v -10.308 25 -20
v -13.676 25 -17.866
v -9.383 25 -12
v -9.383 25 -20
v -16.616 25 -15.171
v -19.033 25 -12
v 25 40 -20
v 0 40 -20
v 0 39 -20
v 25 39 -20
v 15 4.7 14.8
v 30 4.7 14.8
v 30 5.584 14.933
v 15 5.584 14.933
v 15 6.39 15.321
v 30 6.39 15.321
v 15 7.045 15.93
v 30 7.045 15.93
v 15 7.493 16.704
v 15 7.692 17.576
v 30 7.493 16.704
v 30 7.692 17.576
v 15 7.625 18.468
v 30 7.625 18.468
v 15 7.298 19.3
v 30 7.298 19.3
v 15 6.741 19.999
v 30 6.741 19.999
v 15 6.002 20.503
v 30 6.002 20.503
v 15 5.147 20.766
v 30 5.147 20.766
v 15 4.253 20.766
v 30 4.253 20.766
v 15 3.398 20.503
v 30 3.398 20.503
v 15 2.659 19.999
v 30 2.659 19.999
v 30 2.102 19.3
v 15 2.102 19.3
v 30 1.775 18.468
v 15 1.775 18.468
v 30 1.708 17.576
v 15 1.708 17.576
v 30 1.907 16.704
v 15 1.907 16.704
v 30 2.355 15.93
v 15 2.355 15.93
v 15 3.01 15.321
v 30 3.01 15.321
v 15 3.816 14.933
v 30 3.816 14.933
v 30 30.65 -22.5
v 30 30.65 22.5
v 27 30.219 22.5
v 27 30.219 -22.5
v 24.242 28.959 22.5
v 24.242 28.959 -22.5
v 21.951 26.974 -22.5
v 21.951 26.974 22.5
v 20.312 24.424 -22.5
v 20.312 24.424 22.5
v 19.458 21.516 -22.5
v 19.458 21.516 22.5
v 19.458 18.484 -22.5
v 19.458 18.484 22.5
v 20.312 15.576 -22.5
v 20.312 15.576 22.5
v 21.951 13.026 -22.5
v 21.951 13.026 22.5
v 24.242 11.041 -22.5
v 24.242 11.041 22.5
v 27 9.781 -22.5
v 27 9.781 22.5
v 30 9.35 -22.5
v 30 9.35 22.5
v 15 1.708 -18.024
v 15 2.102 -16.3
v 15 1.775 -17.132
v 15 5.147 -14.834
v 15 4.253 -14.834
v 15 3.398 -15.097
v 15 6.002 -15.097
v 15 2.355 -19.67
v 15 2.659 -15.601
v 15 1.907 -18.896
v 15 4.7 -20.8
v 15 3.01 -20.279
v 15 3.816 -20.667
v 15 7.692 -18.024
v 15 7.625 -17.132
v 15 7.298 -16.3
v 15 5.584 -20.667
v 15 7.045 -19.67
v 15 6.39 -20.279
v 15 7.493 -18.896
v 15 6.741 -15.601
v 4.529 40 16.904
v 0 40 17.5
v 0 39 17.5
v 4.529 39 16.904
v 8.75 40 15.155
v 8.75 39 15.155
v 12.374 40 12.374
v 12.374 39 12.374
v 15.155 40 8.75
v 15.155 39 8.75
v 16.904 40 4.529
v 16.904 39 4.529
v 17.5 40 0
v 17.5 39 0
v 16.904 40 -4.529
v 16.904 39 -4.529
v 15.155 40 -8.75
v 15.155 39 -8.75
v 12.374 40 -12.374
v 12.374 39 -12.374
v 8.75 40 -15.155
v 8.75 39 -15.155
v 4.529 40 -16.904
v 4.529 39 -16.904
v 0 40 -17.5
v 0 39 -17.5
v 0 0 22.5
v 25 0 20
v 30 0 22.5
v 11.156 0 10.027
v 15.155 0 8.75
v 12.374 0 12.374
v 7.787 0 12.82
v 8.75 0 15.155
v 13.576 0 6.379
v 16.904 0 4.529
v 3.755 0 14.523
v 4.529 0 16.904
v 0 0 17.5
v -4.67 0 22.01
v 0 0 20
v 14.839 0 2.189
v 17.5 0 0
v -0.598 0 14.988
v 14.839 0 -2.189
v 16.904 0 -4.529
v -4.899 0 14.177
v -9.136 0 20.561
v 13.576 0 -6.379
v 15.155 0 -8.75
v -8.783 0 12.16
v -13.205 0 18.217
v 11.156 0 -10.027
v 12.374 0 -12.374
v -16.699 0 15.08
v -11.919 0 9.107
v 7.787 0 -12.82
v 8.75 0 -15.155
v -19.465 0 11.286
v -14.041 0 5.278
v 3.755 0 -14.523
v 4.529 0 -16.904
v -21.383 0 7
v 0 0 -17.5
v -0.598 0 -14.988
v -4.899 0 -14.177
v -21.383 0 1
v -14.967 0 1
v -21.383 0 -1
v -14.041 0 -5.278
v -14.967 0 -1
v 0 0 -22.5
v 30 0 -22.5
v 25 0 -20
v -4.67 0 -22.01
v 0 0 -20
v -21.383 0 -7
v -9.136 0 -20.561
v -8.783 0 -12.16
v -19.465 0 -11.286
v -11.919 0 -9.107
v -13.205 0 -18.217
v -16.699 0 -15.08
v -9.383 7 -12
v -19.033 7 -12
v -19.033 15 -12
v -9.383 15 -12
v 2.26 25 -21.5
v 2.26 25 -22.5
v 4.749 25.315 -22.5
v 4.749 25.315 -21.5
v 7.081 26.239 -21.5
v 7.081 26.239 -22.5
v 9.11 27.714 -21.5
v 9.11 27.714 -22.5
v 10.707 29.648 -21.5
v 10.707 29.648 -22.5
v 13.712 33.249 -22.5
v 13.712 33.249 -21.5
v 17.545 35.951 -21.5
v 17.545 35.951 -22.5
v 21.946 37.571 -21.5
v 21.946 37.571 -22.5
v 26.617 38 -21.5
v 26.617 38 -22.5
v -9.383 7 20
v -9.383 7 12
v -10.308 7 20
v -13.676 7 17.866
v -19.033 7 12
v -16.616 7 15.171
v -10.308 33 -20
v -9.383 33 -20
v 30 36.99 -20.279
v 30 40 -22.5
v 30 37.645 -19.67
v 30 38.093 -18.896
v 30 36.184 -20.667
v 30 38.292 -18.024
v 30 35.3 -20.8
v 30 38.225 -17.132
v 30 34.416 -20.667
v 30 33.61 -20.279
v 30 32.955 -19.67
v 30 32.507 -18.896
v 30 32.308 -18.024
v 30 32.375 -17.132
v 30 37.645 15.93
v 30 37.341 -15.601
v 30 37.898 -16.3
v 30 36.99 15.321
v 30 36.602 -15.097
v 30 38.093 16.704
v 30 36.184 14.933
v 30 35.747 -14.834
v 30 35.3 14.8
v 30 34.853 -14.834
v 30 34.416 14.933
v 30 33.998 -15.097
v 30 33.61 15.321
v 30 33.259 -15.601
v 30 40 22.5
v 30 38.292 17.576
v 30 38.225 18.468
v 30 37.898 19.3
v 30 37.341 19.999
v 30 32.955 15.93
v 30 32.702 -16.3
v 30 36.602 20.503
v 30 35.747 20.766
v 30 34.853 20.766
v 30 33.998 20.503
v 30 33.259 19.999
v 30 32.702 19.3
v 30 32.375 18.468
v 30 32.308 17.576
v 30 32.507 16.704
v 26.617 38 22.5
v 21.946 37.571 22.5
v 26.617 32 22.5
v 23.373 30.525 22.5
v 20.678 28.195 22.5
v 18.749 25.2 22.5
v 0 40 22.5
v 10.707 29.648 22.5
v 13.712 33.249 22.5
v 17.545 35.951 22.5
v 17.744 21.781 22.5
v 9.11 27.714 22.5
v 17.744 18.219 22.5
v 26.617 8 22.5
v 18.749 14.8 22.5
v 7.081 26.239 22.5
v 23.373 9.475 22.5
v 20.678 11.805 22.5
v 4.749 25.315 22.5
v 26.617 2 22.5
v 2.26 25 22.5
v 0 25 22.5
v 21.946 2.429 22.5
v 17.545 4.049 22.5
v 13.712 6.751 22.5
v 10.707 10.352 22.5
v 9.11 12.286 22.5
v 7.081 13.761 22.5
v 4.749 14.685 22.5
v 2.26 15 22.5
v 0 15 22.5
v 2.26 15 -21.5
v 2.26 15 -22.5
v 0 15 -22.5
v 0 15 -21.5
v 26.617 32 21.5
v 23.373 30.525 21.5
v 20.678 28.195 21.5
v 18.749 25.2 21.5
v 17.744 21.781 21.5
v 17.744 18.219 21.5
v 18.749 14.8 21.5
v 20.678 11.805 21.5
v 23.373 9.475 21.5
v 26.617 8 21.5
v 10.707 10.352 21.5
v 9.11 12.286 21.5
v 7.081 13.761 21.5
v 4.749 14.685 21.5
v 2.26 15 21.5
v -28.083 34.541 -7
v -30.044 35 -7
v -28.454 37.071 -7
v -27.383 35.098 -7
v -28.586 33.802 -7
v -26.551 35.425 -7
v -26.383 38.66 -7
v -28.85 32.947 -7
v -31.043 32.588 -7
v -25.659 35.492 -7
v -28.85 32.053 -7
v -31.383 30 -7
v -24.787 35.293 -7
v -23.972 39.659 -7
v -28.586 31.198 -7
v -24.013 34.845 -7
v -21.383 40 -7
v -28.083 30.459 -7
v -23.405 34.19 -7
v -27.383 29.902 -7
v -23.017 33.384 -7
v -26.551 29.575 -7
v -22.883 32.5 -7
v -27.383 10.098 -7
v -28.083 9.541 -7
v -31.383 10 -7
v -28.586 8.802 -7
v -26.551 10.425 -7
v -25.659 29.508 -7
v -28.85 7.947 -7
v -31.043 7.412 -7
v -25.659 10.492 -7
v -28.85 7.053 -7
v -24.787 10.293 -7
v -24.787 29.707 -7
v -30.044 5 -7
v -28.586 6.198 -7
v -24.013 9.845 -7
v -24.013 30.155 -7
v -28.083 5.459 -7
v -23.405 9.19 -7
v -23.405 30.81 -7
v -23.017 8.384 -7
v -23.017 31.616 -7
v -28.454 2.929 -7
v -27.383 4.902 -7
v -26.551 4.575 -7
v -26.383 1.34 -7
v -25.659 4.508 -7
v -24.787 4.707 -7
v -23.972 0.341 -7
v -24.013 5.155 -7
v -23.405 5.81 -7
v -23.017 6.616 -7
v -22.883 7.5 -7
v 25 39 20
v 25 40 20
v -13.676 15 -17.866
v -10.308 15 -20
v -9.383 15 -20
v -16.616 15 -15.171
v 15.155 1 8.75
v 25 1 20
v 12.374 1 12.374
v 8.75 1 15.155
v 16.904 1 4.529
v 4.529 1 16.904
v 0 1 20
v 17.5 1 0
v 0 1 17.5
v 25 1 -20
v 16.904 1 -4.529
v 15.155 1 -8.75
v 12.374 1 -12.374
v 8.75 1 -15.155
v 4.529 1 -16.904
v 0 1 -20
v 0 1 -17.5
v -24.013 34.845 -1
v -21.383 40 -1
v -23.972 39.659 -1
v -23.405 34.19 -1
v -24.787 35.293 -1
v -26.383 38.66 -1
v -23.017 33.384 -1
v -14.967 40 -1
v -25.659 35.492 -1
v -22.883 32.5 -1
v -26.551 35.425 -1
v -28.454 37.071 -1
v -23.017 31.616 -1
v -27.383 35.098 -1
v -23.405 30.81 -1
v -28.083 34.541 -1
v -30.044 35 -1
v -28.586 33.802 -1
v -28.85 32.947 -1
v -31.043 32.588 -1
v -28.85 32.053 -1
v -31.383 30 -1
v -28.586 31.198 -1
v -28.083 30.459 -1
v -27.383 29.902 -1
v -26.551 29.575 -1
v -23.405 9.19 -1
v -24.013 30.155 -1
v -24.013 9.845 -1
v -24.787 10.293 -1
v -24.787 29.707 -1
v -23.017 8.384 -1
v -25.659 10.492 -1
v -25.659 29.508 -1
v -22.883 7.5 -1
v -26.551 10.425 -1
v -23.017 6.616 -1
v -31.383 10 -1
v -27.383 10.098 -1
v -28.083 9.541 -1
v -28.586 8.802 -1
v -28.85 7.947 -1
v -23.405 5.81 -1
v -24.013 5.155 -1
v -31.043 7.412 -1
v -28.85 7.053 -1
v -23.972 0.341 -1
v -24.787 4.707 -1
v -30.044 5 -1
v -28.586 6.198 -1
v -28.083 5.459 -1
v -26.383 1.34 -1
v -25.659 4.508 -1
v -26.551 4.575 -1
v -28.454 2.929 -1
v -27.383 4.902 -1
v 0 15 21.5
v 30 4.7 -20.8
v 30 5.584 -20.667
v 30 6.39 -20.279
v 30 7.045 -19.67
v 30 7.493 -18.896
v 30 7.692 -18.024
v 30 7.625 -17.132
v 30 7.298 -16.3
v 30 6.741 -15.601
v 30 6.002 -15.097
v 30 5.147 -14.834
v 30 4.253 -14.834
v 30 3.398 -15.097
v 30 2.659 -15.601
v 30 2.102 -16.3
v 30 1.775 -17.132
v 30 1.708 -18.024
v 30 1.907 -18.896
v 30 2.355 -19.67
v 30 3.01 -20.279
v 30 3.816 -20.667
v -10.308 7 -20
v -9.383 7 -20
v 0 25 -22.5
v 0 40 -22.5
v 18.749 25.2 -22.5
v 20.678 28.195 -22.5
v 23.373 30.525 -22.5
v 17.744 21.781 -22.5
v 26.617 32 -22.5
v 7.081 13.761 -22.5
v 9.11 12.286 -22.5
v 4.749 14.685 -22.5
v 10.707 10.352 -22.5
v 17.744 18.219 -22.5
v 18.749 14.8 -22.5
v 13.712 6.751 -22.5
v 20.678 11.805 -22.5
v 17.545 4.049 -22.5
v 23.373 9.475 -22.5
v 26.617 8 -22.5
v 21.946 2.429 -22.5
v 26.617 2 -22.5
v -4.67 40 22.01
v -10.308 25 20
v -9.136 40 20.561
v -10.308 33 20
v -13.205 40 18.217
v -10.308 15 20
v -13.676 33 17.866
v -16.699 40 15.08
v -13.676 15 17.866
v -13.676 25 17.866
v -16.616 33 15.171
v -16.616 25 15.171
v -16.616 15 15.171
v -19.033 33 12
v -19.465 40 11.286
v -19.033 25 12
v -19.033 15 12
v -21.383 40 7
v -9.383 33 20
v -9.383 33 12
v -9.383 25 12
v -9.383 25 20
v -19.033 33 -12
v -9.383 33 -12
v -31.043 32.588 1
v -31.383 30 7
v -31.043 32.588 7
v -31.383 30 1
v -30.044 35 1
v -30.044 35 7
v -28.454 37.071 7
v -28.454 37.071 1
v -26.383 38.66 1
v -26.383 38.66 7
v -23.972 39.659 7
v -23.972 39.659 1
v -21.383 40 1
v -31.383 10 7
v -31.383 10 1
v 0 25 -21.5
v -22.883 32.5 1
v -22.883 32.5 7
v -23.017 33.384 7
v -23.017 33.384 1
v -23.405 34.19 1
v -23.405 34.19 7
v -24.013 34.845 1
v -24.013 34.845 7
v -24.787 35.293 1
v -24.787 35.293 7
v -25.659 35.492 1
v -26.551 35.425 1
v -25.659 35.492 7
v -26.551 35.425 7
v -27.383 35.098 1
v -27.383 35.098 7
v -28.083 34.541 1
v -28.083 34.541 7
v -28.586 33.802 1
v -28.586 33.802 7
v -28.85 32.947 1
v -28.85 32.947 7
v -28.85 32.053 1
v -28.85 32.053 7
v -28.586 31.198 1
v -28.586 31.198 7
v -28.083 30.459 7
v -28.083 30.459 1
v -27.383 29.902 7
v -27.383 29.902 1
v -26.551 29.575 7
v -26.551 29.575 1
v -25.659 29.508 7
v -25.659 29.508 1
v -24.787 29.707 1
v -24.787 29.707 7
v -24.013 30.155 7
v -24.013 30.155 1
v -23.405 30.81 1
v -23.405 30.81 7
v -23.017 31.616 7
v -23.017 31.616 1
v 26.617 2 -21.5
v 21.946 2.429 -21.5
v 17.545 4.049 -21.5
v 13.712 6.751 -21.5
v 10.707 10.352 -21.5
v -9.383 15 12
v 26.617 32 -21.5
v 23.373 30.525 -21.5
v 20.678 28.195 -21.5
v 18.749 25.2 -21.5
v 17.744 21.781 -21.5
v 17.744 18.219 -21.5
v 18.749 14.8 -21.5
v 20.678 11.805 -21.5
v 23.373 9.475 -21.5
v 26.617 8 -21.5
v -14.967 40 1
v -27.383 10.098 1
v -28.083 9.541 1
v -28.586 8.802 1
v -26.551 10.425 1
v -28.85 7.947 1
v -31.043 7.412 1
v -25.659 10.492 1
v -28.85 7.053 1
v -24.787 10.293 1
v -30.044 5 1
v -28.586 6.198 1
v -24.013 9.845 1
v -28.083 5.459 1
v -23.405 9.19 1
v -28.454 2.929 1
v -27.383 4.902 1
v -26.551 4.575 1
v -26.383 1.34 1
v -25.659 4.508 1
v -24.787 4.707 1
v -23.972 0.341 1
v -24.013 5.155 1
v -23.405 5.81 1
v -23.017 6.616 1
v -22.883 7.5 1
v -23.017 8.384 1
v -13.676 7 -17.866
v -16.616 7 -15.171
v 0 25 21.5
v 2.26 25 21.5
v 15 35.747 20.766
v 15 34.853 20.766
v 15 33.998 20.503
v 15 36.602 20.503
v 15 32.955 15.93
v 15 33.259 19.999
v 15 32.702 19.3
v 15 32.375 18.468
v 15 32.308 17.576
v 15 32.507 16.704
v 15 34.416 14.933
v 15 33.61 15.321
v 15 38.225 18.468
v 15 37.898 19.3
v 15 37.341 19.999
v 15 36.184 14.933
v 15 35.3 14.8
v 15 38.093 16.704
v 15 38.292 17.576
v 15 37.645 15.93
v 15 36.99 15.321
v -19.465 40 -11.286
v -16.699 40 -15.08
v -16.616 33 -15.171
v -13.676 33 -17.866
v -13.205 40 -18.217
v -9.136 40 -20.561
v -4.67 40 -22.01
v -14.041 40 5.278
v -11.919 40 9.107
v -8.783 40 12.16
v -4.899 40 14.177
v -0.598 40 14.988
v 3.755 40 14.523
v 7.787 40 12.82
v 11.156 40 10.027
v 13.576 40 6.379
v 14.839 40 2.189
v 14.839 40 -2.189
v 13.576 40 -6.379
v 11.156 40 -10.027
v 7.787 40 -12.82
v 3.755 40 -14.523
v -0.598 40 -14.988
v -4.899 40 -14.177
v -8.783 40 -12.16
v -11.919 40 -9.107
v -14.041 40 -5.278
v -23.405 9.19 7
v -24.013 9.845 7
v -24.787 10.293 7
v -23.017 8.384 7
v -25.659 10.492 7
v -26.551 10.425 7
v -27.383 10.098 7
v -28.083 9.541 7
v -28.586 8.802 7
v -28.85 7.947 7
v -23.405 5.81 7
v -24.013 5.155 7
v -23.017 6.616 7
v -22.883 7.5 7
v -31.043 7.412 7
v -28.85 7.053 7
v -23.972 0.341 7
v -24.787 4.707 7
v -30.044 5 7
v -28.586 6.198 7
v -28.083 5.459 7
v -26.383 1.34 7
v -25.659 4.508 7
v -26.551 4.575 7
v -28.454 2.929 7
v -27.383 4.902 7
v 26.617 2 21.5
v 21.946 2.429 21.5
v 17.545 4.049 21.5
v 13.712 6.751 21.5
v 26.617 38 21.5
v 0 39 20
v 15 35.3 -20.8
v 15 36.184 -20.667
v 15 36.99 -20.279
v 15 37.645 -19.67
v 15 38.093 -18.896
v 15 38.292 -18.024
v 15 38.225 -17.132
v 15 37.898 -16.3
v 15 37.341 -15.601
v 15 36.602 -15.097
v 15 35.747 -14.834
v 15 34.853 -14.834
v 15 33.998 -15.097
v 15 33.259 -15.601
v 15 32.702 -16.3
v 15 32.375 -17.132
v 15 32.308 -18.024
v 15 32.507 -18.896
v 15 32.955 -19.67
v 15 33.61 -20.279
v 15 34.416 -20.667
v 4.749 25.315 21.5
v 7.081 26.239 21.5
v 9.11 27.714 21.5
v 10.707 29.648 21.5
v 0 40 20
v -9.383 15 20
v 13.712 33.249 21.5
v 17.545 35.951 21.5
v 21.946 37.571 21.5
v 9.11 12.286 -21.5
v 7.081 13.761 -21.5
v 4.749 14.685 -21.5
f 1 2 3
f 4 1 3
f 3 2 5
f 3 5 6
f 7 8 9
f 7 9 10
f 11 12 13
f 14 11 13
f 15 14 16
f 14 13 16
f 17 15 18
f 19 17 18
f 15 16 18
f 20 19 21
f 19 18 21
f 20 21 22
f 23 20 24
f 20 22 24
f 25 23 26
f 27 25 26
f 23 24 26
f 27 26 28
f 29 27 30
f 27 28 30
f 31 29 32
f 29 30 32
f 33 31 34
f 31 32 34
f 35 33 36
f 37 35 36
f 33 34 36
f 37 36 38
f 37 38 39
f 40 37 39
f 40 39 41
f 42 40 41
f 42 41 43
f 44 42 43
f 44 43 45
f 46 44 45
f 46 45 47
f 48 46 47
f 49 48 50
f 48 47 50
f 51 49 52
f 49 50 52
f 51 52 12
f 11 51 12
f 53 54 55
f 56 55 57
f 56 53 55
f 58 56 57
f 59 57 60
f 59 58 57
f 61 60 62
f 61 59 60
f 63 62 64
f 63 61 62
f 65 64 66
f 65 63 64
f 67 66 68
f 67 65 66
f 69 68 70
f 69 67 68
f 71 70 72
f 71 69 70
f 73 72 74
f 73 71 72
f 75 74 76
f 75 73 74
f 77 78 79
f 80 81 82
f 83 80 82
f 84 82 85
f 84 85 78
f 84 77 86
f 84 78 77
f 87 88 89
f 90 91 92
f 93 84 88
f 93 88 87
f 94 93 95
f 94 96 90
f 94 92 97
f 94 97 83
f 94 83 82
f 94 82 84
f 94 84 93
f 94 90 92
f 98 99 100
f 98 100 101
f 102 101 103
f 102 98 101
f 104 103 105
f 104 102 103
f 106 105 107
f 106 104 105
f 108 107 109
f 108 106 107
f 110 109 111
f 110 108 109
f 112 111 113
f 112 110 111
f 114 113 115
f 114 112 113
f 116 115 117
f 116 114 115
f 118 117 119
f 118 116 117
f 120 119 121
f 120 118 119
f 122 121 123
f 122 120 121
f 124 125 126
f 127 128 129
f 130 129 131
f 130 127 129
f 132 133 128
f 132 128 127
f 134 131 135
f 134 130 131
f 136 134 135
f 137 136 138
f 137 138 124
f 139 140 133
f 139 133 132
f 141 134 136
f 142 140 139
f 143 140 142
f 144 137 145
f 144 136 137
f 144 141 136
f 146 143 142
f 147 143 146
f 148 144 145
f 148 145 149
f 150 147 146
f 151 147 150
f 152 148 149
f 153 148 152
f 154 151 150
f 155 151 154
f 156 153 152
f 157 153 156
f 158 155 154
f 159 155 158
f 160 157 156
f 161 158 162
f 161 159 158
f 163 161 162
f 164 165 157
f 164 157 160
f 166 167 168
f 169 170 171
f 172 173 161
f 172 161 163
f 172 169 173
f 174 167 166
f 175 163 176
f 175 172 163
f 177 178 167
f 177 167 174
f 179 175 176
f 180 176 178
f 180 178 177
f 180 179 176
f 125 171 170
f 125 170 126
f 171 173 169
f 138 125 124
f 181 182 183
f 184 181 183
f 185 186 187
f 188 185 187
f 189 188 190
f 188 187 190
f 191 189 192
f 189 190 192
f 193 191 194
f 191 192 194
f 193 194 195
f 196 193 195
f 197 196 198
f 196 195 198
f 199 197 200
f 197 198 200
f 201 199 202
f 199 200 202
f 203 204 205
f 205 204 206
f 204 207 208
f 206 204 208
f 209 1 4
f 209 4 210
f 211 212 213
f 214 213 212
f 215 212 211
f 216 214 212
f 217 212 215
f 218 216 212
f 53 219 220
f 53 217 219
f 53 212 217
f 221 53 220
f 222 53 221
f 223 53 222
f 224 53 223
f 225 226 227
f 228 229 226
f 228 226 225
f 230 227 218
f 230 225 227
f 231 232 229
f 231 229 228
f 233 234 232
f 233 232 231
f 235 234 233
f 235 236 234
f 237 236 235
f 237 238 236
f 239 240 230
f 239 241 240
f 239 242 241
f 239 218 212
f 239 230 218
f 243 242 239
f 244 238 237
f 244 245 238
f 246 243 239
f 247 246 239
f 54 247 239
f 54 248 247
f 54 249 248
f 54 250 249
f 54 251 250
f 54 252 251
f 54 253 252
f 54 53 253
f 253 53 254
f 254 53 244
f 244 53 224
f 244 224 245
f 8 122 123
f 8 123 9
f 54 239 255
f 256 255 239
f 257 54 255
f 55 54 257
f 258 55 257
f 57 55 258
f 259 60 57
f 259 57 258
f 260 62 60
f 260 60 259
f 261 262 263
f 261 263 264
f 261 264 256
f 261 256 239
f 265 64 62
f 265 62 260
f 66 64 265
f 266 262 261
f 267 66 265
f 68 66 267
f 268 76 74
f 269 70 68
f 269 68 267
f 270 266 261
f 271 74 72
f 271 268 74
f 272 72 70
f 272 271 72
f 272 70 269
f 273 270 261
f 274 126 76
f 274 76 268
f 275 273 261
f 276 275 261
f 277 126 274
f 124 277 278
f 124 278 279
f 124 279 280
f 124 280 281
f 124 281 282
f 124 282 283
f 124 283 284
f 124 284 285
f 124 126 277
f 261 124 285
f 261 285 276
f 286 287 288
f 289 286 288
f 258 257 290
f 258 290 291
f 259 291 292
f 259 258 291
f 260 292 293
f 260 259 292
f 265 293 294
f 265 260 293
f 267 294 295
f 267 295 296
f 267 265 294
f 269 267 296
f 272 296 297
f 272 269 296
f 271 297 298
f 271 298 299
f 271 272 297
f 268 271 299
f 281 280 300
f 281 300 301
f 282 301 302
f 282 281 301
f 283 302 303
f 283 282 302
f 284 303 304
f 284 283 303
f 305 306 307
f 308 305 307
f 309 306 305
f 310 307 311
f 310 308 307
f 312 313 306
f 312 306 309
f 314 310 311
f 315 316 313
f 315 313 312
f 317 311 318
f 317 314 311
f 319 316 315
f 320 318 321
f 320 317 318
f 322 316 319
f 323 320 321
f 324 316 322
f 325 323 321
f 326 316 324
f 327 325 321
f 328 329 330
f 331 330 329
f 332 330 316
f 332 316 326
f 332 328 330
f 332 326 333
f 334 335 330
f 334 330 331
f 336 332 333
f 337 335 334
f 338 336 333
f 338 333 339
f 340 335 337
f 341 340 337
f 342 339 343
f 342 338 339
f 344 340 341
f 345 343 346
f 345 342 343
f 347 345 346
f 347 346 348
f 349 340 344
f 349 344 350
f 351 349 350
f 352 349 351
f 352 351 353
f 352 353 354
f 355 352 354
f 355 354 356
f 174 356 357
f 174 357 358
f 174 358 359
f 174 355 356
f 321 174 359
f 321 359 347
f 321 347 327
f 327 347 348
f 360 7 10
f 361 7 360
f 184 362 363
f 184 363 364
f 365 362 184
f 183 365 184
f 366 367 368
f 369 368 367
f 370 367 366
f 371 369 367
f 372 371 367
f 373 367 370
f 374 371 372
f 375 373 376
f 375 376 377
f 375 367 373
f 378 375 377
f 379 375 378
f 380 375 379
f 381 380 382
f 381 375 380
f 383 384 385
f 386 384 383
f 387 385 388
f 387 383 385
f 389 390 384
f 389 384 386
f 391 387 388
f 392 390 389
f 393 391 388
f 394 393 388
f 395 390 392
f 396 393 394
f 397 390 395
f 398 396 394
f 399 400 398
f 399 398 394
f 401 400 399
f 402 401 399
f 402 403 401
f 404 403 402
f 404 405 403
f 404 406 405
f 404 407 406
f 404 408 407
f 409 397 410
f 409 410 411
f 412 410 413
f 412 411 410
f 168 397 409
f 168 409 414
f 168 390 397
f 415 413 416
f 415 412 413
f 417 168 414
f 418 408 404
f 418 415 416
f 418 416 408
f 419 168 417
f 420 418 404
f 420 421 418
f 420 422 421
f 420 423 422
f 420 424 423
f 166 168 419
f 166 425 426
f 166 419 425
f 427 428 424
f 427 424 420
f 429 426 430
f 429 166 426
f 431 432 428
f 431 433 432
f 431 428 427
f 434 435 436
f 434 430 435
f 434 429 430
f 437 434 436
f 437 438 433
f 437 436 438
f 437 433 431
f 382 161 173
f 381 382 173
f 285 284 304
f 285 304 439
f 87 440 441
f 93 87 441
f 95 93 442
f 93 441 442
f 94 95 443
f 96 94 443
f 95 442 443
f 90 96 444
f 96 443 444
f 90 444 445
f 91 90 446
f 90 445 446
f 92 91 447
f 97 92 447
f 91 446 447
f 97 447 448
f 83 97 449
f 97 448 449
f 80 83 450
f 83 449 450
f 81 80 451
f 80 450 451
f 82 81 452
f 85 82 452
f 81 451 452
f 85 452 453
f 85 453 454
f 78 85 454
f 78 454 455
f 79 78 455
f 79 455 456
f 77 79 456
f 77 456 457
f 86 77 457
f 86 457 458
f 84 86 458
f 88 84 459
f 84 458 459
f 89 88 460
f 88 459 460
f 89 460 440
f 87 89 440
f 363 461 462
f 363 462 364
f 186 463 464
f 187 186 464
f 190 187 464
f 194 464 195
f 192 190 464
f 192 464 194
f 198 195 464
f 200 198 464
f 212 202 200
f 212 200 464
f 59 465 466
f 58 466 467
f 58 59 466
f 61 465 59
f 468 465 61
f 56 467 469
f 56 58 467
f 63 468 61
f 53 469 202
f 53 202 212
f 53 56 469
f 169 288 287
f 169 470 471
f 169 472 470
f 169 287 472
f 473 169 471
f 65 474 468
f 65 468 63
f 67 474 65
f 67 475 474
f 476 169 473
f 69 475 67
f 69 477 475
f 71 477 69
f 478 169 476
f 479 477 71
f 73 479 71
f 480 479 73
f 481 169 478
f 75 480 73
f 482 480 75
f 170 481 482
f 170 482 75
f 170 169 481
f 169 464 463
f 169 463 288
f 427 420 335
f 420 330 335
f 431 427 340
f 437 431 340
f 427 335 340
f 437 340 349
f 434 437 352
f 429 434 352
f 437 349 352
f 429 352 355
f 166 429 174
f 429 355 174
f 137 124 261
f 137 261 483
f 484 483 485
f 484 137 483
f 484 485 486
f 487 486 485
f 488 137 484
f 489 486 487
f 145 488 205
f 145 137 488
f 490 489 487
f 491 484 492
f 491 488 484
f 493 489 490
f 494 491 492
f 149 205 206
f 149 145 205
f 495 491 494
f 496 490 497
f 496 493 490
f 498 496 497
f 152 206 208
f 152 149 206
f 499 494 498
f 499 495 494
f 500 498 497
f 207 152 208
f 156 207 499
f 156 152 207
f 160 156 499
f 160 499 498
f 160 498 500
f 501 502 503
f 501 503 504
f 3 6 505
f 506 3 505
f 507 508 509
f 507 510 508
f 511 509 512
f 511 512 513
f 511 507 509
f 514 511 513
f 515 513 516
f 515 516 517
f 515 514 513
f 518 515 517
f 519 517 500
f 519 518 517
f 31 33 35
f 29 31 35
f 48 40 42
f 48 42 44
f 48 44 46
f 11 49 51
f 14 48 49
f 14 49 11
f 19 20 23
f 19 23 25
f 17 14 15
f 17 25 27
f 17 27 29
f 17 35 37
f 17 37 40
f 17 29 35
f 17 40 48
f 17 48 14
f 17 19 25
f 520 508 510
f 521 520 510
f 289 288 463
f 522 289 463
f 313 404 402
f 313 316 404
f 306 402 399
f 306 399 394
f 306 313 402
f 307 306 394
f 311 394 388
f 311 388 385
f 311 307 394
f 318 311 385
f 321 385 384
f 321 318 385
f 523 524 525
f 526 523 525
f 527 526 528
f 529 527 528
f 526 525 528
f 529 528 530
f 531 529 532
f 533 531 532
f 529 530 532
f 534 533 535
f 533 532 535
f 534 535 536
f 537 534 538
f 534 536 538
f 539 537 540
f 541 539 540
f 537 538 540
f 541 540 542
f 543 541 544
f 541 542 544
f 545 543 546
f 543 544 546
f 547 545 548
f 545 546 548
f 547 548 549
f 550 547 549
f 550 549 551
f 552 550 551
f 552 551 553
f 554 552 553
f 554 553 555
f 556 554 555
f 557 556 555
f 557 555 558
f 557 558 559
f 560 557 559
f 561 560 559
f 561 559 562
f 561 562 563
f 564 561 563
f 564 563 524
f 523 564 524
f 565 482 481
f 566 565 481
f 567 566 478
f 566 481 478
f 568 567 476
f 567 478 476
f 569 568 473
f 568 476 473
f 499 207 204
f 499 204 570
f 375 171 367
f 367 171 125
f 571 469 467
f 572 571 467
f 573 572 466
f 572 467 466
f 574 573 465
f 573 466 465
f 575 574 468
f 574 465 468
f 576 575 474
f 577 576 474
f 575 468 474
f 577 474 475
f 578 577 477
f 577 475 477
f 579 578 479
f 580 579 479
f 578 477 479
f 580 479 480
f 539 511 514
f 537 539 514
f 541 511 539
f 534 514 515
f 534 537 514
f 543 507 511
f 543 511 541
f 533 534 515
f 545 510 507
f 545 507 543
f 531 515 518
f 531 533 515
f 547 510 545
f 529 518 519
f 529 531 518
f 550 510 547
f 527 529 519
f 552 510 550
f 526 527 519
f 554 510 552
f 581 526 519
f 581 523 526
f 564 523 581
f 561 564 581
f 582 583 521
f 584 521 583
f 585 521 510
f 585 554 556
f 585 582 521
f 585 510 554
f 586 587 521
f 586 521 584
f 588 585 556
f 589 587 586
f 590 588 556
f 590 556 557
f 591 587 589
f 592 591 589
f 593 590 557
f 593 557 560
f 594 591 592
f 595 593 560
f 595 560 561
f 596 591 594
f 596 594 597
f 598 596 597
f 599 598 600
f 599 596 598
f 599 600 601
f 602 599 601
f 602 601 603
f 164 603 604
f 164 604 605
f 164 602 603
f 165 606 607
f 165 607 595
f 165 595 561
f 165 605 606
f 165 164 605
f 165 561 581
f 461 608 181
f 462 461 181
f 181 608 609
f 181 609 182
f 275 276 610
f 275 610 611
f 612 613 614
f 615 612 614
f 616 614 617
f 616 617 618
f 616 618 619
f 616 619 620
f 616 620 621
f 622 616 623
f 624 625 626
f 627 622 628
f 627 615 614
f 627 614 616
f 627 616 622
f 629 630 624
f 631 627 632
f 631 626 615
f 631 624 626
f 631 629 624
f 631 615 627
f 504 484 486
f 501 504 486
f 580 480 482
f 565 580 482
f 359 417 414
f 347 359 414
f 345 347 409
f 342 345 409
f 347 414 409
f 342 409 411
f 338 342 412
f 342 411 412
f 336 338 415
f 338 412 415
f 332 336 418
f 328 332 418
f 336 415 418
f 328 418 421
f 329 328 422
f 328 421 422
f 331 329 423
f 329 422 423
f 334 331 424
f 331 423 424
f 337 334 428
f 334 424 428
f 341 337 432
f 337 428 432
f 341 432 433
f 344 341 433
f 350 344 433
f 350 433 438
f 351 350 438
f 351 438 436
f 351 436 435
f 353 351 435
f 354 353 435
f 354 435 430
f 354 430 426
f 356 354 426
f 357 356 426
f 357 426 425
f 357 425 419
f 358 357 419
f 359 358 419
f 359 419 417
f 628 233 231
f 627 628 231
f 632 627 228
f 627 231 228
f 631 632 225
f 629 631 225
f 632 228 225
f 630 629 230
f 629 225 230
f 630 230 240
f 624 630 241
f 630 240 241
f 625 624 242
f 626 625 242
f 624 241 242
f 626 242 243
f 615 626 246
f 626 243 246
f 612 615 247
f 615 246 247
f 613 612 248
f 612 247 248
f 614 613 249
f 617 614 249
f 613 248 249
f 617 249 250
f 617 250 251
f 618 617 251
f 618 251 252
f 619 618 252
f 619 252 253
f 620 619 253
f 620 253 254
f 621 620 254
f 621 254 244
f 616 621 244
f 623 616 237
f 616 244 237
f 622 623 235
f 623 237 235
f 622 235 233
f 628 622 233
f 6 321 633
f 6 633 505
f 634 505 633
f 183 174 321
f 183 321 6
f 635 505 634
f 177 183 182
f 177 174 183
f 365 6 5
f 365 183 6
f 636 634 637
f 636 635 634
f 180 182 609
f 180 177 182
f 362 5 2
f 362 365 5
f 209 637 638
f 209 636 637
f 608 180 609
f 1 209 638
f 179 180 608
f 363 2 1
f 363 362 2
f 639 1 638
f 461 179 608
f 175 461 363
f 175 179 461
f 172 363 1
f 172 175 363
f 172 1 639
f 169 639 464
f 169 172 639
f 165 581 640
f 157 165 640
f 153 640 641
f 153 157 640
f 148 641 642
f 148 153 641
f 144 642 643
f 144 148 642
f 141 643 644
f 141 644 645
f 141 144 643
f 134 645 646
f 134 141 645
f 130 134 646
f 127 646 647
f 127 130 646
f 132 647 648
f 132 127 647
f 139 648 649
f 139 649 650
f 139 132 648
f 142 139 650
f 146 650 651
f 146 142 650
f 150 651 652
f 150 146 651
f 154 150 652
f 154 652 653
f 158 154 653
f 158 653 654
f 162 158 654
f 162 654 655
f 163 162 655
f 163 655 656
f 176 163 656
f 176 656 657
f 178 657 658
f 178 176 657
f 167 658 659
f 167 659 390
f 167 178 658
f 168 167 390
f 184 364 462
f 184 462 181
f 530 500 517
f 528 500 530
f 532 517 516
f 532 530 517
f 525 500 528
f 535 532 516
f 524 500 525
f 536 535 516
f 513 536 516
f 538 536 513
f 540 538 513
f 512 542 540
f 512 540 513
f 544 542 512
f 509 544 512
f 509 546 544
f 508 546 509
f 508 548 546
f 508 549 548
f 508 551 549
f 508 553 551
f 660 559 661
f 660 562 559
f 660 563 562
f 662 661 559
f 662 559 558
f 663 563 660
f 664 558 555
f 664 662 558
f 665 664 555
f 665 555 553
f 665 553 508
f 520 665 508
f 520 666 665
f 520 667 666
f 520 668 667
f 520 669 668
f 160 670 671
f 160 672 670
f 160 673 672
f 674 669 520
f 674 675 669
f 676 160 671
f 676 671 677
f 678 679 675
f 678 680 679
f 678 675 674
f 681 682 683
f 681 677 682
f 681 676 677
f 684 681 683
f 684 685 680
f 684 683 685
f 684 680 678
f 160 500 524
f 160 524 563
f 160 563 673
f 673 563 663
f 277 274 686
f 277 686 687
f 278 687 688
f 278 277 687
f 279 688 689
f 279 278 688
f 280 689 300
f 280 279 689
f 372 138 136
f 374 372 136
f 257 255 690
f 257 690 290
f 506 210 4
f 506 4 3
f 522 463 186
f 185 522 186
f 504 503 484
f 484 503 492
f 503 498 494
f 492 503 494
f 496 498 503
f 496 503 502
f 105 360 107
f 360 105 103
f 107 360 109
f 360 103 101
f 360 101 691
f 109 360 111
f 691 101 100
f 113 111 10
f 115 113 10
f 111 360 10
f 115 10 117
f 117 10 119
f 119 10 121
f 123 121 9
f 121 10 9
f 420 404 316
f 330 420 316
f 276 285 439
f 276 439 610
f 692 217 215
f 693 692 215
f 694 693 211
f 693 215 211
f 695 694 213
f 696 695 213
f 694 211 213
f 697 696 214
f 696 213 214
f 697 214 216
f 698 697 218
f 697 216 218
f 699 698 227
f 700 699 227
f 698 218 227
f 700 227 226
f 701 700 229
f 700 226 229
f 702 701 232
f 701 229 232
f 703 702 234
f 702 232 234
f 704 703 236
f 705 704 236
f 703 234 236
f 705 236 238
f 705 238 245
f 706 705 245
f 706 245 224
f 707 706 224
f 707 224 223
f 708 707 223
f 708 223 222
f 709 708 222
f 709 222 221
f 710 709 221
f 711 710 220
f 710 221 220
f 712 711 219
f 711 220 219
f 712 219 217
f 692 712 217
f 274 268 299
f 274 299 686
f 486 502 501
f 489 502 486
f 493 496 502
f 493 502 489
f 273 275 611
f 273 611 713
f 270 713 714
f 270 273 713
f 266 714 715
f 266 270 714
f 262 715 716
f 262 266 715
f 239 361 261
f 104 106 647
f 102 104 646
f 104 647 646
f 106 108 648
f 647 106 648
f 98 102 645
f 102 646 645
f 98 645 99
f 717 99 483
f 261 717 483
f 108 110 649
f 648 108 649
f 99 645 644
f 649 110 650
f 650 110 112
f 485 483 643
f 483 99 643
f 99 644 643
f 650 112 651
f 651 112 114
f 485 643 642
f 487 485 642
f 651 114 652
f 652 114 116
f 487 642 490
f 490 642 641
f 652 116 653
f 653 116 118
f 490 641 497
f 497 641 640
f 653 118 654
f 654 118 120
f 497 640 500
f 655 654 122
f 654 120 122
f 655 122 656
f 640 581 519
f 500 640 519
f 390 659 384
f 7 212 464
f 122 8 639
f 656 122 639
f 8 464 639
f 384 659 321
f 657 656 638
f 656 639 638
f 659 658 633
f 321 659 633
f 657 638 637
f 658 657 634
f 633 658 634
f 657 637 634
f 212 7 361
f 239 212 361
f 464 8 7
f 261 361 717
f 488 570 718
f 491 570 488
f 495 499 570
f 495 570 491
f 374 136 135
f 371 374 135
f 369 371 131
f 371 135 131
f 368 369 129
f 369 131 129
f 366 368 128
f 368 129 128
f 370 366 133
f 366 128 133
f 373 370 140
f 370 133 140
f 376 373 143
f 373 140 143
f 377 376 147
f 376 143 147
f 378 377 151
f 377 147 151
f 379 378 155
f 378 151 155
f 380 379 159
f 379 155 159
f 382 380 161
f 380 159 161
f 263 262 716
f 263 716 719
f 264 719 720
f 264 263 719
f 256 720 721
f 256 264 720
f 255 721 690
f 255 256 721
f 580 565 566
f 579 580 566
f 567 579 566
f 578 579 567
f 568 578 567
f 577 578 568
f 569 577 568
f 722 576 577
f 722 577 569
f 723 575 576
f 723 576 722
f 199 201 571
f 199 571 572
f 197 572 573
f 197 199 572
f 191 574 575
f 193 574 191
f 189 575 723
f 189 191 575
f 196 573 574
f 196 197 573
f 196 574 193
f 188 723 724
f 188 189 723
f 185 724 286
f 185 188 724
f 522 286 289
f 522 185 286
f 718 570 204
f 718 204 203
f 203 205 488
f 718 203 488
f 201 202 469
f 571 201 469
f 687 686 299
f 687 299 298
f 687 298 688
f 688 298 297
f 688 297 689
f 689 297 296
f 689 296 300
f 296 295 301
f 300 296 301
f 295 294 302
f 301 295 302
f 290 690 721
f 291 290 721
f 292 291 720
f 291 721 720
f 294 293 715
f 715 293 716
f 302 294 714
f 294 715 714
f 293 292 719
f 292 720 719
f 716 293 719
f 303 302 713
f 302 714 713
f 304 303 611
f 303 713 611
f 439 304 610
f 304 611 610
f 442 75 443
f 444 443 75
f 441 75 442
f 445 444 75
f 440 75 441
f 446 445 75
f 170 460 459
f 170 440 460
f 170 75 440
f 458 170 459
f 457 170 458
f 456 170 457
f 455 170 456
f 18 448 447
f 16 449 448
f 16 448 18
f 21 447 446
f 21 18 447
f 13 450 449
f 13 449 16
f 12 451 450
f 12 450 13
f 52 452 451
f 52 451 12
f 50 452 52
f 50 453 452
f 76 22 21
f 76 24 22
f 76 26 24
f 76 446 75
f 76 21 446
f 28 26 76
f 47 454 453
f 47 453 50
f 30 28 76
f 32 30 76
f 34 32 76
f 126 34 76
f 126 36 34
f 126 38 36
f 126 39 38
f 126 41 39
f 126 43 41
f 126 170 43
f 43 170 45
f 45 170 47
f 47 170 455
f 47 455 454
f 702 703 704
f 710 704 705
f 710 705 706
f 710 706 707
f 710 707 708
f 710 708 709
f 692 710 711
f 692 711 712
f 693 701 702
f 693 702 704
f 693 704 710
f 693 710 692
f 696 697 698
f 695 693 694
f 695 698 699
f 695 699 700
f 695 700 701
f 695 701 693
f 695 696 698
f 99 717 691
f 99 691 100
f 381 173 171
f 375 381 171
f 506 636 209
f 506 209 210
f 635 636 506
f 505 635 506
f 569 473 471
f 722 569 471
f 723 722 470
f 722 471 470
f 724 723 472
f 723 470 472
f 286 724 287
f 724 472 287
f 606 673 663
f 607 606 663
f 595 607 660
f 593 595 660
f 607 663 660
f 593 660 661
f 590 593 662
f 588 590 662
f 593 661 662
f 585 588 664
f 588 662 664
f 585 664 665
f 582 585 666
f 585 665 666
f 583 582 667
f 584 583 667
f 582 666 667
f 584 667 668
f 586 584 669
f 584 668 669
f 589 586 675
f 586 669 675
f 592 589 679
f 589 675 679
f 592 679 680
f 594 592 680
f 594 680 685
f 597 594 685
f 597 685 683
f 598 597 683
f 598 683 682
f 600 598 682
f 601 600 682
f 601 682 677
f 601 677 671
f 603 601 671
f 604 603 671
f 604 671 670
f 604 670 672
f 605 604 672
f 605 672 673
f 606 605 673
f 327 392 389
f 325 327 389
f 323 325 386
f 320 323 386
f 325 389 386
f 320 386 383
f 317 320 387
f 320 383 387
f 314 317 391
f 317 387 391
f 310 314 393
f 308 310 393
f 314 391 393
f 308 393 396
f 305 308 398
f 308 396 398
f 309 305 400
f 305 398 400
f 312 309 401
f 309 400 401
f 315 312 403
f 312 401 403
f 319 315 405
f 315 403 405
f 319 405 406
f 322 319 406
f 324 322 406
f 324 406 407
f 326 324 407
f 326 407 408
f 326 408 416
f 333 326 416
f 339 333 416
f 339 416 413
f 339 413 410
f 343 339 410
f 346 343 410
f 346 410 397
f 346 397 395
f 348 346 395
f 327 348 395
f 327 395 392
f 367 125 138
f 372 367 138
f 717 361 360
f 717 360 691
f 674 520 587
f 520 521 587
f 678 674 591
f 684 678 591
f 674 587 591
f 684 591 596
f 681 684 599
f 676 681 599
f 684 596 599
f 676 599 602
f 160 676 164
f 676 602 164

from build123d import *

# Parameters (mm, degrees)
BOSS_EXTRUDE1_DEPTH     = 40
FILLET1_R               = 10
SKETCH2_R               = 3
CUT_EXTRUDE1_DEPTH      = 30
CUT_EXTRUDE2_DEPTH      = 56.598274214
CUT_EXTRUDE2_DEPTH_BACK = 56.598274214
SKETCH4_R               = 10.65
SKETCH3_R               = 3
CUT_EXTRUDE3_DEPTH      = 15
SKETCH10_W              = 8
SKETCH10_H              = 8
CUT_EXTRUDE4_DEPTH      = 22
CUT_EXTRUDE5_DEPTH      = 1
CUT_EXTRUDE6_DEPTH      = 1


with BuildPart() as part:
    # Sketch1 → Boss-Extrude1 (new body)
    with BuildSketch(Plane(origin=(0, 0, 0), x_dir=(1, 0, 0), z_dir=(0, 1, 0))):
        with BuildLine():
            Line((0, 22.5), (30, 22.5))
            Line((30, 22.5), (30, -22.5))
            Line((30, -22.5), (0, -22.5))
            ThreePointArc((0, -22.5), (-13.205112646, -18.217436702), (-21.38340478, -7))
            Line((-21.38340478, -7), (-31.38340478, -7))
            Line((-31.38340478, -7), (-31.38340478, -1))
            Line((-31.38340478, -1), (-14.966629547, -1))
            ThreePointArc((-14.966629547, -1), (15, 0), (-14.966629547, 1))
            Line((-14.966629547, 1), (-31.38340478, 1))
            Line((-31.38340478, 1), (-31.38340478, 7))
            Line((-31.38340478, 7), (-21.38340478, 7))
            ThreePointArc((-21.38340478, 7), (-13.205112646, 18.217436702), (0, 22.5))
        make_face()
    extrude(amount=BOSS_EXTRUDE1_DEPTH)

    # Fillet1
    fillet1_edges = [part.edges().sort_by_distance(p)[0] for p in [
        (-31.38340478, 40, -4),
        (-31.38340478, 0, -4),
        (-31.38340478, 0, 4),
        (-31.38340478, 40, 4),
    ]]
    fillet(fillet1_edges, radius=FILLET1_R)

    # Sketch2 → Cut-Extrude1 (cut)
    with BuildSketch(Plane.XY.offset(7)):
        with Locations((-25.88340478, 32.5)):
            Circle(SKETCH2_R)
        with Locations((-25.88340478, 7.5)):
            Circle(SKETCH2_R)
    extrude(amount=-CUT_EXTRUDE1_DEPTH, mode=Mode.SUBTRACT)

    # Sketch4 → Cut-Extrude2 (cut, two sides: drawn at the far end of the back side and taken through both)
    with BuildSketch(Plane.XY.offset(-CUT_EXTRUDE2_DEPTH_BACK)):
        with Locations((30, 20)):
            Circle(SKETCH4_R)
    extrude(amount=CUT_EXTRUDE2_DEPTH + CUT_EXTRUDE2_DEPTH_BACK, mode=Mode.SUBTRACT)

    # Sketch3 → Cut-Extrude3 (cut)
    with BuildSketch(Plane(origin=(30, 0, 0), x_dir=(0, 0, -1), z_dir=(1, 0, 0))):
        with Locations((-17.8, 35.3)):
            Circle(SKETCH3_R)
        with Locations((17.8, 35.3)):
            Circle(SKETCH3_R)
        with Locations((17.8, 4.7)):
            Circle(SKETCH3_R)
        with Locations((-17.8, 4.7)):
            Circle(SKETCH3_R)
    extrude(amount=-CUT_EXTRUDE3_DEPTH, mode=Mode.SUBTRACT)

    # Sketch10 → Cut-Extrude4 (cut)
    with BuildSketch(Plane.ZY.offset(31.38340478)):
        with Locations((-16, 29)):
            Rectangle(SKETCH10_W, SKETCH10_H)
        with Locations((16, 29)):
            Rectangle(SKETCH10_W, SKETCH10_H)
        with Locations((16, 11)):
            Rectangle(SKETCH10_W, SKETCH10_H)
        with Locations((-16, 11)):
            Rectangle(SKETCH10_W, SKETCH10_H)
    extrude(amount=-CUT_EXTRUDE4_DEPTH, mode=Mode.SUBTRACT)

    # Sketch11 → Cut-Extrude5 (cut)
    with BuildSketch(Plane(origin=(0, 40, 0), x_dir=(1, 0, 0), z_dir=(0, 1, 0))):
        with BuildLine():
            Line((25, 20), (25, -20))
            Line((25, -20), (0, -20))
            Line((0, -20), (0, -17.5))
            ThreePointArc((0, -17.5), (17.5, 0), (0, 17.5))
            Line((0, 17.5), (0, 20))
            Line((0, 20), (25, 20))
        make_face()
    cut_extrude5 = extrude(amount=-CUT_EXTRUDE5_DEPTH, mode=Mode.SUBTRACT)

    # Sketch14 → Cut-Extrude6 (cut)
    with BuildSketch(Plane.XY.offset(22.5)):
        with BuildLine():
            Line((7.05e-07, 24.999999636), (2.260270537, 24.999999636))
            ThreePointArc((2.260270537, 24.999999636), (7.080945531, 26.238658837), (10.707385838, 29.647781115))
            ThreePointArc((10.707385838, 29.647781115), (17.545274901, 35.950998172), (26.616595925, 37.999999636))
            Line((26.616595925, 37.999999636), (26.616595925, 31.999999636))
            ThreePointArc((26.616595925, 31.999999636), (17.616595925, 19.999999636), (26.616595925, 7.999999636))
            Line((26.616595925, 7.999999636), (26.616595925, 1.999999636))
            ThreePointArc((26.616595925, 1.999999636), (17.545274901, 4.0490011), (10.707385838, 10.352218158))
            ThreePointArc((10.707385838, 10.352218158), (7.080945531, 13.761340436), (2.260270537, 14.999999636))
            Line((2.260270537, 14.999999636), (7.05e-07, 14.999999636))
            Line((7.05e-07, 14.999999636), (7.05e-07, 24.999999636))
        make_face()
    cut_extrude6 = extrude(amount=-CUT_EXTRUDE6_DEPTH, mode=Mode.SUBTRACT)

    # Mirror3: Cut-Extrude6 across plane
    add(cut_extrude6.mirror(Plane.XY), mode=Mode.SUBTRACT)

    # Mirror4: Cut-Extrude5 across plane
    add(cut_extrude5.mirror(Plane.ZX.offset(20)), mode=Mode.SUBTRACT)


solid = part.part
